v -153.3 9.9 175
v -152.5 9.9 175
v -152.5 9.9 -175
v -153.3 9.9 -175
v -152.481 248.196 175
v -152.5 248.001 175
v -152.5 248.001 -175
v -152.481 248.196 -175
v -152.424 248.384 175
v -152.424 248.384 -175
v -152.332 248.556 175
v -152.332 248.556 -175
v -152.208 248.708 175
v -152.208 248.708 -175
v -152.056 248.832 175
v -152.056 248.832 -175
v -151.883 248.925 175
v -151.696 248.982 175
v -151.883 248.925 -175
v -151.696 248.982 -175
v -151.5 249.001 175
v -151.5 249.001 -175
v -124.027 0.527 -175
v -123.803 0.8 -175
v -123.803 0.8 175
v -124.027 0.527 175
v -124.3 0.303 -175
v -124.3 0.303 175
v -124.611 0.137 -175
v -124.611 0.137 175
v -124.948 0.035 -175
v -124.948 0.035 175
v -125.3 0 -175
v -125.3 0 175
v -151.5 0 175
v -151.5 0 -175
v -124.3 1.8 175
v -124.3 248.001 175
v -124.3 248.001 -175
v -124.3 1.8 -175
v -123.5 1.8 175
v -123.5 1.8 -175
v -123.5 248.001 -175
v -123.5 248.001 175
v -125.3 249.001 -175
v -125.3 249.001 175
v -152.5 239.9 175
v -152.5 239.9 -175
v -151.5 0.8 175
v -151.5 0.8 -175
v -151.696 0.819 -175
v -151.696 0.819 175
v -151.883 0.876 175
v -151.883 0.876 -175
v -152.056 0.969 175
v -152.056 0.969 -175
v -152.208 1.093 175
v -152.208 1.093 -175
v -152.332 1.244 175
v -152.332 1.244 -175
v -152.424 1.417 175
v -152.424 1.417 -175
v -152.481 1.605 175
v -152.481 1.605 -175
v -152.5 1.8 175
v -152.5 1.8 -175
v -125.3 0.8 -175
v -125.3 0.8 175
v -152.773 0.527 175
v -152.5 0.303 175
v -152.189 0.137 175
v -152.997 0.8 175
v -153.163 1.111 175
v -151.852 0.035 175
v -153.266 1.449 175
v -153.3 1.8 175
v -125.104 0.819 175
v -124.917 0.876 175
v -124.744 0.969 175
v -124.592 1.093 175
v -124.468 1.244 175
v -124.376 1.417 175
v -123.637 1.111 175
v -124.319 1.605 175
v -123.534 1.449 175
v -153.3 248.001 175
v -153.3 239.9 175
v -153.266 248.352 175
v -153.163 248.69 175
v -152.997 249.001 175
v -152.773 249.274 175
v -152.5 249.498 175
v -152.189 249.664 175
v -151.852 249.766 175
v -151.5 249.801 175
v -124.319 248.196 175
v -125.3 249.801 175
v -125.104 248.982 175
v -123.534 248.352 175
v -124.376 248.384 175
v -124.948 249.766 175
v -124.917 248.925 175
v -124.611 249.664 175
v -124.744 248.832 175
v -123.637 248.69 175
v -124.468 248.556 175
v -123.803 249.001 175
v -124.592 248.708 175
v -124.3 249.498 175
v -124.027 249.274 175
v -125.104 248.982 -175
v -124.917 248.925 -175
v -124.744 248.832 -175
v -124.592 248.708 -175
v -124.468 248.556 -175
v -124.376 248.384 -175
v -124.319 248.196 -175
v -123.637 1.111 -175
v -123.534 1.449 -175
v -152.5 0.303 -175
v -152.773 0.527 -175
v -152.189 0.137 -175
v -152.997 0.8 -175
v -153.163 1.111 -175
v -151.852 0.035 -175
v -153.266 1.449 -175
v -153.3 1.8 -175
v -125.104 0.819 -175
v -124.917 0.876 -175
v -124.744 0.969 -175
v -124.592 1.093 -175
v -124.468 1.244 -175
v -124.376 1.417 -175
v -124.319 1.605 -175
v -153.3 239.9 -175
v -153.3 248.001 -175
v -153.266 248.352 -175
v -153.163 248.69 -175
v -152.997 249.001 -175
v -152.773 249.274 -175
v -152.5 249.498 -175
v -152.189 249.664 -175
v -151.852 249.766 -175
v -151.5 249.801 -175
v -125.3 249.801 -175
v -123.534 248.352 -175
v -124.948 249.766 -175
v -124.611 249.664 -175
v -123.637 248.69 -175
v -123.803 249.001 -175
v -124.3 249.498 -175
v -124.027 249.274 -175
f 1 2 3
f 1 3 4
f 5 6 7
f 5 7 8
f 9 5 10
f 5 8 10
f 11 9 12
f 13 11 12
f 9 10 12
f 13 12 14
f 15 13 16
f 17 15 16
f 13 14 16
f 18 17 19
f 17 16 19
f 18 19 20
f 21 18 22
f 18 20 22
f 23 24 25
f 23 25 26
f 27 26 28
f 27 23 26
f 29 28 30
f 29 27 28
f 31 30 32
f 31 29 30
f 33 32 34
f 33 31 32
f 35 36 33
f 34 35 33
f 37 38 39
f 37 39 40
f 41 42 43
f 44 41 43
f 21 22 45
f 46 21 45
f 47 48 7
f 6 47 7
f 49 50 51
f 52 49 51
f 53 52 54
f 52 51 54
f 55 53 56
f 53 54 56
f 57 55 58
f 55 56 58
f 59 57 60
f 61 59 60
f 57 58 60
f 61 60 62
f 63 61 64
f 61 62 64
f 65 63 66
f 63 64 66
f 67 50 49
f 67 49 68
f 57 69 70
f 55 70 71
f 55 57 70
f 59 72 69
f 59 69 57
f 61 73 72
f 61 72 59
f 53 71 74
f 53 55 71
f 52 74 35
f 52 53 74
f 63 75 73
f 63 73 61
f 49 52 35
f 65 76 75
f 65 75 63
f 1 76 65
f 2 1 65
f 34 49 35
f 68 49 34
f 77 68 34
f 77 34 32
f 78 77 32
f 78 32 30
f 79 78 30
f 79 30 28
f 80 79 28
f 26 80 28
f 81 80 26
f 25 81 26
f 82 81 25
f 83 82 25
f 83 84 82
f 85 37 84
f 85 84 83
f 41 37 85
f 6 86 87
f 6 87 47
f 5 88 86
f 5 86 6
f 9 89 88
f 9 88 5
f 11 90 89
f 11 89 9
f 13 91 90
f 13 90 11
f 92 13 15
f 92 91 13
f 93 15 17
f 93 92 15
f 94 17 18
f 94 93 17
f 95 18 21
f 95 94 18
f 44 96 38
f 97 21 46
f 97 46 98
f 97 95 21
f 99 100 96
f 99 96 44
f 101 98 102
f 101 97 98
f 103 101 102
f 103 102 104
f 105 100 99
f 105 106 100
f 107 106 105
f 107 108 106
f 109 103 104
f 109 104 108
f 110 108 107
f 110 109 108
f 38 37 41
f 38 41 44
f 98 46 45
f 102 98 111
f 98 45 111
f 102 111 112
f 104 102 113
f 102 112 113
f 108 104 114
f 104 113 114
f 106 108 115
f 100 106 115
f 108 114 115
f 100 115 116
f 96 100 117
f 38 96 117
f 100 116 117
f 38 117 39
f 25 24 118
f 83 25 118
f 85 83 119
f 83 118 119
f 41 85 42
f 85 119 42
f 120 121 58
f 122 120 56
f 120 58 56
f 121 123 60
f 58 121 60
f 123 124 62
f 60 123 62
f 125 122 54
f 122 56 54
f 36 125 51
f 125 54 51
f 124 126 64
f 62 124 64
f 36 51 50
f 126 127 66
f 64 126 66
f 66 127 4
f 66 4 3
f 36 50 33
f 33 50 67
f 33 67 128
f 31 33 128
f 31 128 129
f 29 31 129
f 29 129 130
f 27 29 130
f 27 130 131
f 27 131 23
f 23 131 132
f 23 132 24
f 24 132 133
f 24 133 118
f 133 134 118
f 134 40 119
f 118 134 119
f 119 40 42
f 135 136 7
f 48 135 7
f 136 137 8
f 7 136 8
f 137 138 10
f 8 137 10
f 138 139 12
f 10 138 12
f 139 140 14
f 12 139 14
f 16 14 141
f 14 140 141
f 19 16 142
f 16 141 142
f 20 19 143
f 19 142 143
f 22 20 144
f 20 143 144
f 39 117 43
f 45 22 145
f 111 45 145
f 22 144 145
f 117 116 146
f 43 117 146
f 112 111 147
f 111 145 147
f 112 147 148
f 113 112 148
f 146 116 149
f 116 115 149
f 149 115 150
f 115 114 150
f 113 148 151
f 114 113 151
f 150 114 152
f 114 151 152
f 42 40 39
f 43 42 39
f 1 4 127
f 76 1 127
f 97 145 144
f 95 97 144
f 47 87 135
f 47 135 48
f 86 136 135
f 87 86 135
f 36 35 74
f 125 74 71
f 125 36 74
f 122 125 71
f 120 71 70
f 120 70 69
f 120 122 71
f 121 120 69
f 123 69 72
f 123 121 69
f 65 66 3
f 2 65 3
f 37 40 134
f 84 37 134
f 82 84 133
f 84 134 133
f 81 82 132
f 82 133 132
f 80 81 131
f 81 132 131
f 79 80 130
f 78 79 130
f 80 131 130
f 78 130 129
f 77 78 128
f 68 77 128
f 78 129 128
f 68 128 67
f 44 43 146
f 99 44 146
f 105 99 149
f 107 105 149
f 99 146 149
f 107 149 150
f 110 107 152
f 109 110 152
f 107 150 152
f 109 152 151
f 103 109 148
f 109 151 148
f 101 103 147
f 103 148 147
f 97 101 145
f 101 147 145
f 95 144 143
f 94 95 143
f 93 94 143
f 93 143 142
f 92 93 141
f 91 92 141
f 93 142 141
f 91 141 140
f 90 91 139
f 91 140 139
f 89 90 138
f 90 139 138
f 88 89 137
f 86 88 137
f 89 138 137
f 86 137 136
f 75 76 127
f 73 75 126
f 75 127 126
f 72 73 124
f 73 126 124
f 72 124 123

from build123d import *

# Parameters (mm, degrees)
SKETCH1_W              = 323.6
SKETCH1_H              = 350
BASE_FLANGE1_DEPTH     = 0.8
SKETCHED_START         = -175
SKETCHED_BEND3_DEPTH   = 350
SKETCHED_BEND3_2_DEPTH = 350


# Read off the part's stored shape, not the designer's step: Sketched Bend3
# Sheet-metal steps are written as plain solids
with BuildPart() as part:
    # Sketch1 → Base-Flange1 (new body)
    with BuildSketch(Plane(origin=(0, 0, 0), x_dir=(1, 0, 0), z_dir=(0, 1, 0))):
        Rectangle(SKETCH1_W, SKETCH1_H)
    extrude(amount=BASE_FLANGE1_DEPTH)

    # Sketched Bend3 outline → Sketched Bend3 (cut)
    with BuildSketch(Plane.XY.offset(SKETCHED_START)):
        with BuildLine():
            Line((161.8, 0.8), (-123.802894475, 0.8))
            ThreePointArc((-123.802894475, 0.8), (-124.451029292, 0.212549213), (-125.299557429, 0))
            Line((-125.299557429, 0), (161.8, 0))
            Line((161.8, 0), (161.8, 0.8))
        make_face()
        with BuildLine():
            Line((-161.8, 0), (-151.500442571, 0))
            ThreePointArc((-151.500442571, 0), (-152.348970708, 0.212549213), (-152.997105525, 0.8))
            Line((-152.997105525, 0.8), (-161.8, 0.8))
            Line((-161.8, 0.8), (-161.8, 0))
        make_face()
    extrude(amount=SKETCHED_BEND3_DEPTH, mode=Mode.SUBTRACT)

    # Sketched Bend3 2 outline → Sketched Bend3 2 (add)
    with BuildSketch(Plane.XY.offset(SKETCHED_START)):
        with BuildLine():
            ThreePointArc((-123.802894475, 0.8), (-123.577060213, 1.277502784), (-123.499557429, 1.8))
            Line((-123.499557429, 1.8), (-123.499557429, 248.000885142))
            ThreePointArc((-123.499557429, 248.000885142), (-124.026765223, 249.273677349), (-125.299557429, 249.800885142))
            Line((-125.299557429, 249.800885142), (-151.500442571, 249.800885142))
            ThreePointArc((-151.500442571, 249.800885142), (-152.773234777, 249.273677348), (-153.300442571, 248.000885142))
            Line((-153.300442571, 248.000885142), (-153.300442571, 239.900442571))
            Line((-153.300442571, 239.900442571), (-152.500442571, 239.900442571))
            Line((-152.500442571, 239.900442571), (-152.500442571, 248.000885142))
            ThreePointArc((-152.500442571, 248.000885142), (-152.207549352, 248.707991924), (-151.500442571, 249.000885142))
            Line((-151.500442571, 249.000885142), (-125.299557429, 249.000885142))
            ThreePointArc((-125.299557429, 249.000885142), (-124.592450648, 248.707991924), (-124.299557429, 248.000885142))
            Line((-124.299557429, 248.000885142), (-124.299557429, 1.8))
            ThreePointArc((-124.299557429, 1.8), (-124.592450648, 1.092893219), (-125.299557429, 0.8))
            Line((-125.299557429, 0.8), (-123.802894475, 0.8))
        make_face()
        with BuildLine():
            Line((-152.997105525, 0.8), (-151.500442571, 0.8))
            ThreePointArc((-151.500442571, 0.8), (-152.207549352, 1.092893219), (-152.500442571, 1.8))
            Line((-152.500442571, 1.8), (-152.500442571, 9.900442571))
            Line((-152.500442571, 9.900442571), (-153.300442571, 9.900442571))
            Line((-153.300442571, 9.900442571), (-153.300442571, 1.8))
            ThreePointArc((-153.300442571, 1.8), (-153.222939787, 1.277502784), (-152.997105525, 0.8))
        make_face()
    extrude(amount=SKETCHED_BEND3_2_DEPTH)


solid = part.part
